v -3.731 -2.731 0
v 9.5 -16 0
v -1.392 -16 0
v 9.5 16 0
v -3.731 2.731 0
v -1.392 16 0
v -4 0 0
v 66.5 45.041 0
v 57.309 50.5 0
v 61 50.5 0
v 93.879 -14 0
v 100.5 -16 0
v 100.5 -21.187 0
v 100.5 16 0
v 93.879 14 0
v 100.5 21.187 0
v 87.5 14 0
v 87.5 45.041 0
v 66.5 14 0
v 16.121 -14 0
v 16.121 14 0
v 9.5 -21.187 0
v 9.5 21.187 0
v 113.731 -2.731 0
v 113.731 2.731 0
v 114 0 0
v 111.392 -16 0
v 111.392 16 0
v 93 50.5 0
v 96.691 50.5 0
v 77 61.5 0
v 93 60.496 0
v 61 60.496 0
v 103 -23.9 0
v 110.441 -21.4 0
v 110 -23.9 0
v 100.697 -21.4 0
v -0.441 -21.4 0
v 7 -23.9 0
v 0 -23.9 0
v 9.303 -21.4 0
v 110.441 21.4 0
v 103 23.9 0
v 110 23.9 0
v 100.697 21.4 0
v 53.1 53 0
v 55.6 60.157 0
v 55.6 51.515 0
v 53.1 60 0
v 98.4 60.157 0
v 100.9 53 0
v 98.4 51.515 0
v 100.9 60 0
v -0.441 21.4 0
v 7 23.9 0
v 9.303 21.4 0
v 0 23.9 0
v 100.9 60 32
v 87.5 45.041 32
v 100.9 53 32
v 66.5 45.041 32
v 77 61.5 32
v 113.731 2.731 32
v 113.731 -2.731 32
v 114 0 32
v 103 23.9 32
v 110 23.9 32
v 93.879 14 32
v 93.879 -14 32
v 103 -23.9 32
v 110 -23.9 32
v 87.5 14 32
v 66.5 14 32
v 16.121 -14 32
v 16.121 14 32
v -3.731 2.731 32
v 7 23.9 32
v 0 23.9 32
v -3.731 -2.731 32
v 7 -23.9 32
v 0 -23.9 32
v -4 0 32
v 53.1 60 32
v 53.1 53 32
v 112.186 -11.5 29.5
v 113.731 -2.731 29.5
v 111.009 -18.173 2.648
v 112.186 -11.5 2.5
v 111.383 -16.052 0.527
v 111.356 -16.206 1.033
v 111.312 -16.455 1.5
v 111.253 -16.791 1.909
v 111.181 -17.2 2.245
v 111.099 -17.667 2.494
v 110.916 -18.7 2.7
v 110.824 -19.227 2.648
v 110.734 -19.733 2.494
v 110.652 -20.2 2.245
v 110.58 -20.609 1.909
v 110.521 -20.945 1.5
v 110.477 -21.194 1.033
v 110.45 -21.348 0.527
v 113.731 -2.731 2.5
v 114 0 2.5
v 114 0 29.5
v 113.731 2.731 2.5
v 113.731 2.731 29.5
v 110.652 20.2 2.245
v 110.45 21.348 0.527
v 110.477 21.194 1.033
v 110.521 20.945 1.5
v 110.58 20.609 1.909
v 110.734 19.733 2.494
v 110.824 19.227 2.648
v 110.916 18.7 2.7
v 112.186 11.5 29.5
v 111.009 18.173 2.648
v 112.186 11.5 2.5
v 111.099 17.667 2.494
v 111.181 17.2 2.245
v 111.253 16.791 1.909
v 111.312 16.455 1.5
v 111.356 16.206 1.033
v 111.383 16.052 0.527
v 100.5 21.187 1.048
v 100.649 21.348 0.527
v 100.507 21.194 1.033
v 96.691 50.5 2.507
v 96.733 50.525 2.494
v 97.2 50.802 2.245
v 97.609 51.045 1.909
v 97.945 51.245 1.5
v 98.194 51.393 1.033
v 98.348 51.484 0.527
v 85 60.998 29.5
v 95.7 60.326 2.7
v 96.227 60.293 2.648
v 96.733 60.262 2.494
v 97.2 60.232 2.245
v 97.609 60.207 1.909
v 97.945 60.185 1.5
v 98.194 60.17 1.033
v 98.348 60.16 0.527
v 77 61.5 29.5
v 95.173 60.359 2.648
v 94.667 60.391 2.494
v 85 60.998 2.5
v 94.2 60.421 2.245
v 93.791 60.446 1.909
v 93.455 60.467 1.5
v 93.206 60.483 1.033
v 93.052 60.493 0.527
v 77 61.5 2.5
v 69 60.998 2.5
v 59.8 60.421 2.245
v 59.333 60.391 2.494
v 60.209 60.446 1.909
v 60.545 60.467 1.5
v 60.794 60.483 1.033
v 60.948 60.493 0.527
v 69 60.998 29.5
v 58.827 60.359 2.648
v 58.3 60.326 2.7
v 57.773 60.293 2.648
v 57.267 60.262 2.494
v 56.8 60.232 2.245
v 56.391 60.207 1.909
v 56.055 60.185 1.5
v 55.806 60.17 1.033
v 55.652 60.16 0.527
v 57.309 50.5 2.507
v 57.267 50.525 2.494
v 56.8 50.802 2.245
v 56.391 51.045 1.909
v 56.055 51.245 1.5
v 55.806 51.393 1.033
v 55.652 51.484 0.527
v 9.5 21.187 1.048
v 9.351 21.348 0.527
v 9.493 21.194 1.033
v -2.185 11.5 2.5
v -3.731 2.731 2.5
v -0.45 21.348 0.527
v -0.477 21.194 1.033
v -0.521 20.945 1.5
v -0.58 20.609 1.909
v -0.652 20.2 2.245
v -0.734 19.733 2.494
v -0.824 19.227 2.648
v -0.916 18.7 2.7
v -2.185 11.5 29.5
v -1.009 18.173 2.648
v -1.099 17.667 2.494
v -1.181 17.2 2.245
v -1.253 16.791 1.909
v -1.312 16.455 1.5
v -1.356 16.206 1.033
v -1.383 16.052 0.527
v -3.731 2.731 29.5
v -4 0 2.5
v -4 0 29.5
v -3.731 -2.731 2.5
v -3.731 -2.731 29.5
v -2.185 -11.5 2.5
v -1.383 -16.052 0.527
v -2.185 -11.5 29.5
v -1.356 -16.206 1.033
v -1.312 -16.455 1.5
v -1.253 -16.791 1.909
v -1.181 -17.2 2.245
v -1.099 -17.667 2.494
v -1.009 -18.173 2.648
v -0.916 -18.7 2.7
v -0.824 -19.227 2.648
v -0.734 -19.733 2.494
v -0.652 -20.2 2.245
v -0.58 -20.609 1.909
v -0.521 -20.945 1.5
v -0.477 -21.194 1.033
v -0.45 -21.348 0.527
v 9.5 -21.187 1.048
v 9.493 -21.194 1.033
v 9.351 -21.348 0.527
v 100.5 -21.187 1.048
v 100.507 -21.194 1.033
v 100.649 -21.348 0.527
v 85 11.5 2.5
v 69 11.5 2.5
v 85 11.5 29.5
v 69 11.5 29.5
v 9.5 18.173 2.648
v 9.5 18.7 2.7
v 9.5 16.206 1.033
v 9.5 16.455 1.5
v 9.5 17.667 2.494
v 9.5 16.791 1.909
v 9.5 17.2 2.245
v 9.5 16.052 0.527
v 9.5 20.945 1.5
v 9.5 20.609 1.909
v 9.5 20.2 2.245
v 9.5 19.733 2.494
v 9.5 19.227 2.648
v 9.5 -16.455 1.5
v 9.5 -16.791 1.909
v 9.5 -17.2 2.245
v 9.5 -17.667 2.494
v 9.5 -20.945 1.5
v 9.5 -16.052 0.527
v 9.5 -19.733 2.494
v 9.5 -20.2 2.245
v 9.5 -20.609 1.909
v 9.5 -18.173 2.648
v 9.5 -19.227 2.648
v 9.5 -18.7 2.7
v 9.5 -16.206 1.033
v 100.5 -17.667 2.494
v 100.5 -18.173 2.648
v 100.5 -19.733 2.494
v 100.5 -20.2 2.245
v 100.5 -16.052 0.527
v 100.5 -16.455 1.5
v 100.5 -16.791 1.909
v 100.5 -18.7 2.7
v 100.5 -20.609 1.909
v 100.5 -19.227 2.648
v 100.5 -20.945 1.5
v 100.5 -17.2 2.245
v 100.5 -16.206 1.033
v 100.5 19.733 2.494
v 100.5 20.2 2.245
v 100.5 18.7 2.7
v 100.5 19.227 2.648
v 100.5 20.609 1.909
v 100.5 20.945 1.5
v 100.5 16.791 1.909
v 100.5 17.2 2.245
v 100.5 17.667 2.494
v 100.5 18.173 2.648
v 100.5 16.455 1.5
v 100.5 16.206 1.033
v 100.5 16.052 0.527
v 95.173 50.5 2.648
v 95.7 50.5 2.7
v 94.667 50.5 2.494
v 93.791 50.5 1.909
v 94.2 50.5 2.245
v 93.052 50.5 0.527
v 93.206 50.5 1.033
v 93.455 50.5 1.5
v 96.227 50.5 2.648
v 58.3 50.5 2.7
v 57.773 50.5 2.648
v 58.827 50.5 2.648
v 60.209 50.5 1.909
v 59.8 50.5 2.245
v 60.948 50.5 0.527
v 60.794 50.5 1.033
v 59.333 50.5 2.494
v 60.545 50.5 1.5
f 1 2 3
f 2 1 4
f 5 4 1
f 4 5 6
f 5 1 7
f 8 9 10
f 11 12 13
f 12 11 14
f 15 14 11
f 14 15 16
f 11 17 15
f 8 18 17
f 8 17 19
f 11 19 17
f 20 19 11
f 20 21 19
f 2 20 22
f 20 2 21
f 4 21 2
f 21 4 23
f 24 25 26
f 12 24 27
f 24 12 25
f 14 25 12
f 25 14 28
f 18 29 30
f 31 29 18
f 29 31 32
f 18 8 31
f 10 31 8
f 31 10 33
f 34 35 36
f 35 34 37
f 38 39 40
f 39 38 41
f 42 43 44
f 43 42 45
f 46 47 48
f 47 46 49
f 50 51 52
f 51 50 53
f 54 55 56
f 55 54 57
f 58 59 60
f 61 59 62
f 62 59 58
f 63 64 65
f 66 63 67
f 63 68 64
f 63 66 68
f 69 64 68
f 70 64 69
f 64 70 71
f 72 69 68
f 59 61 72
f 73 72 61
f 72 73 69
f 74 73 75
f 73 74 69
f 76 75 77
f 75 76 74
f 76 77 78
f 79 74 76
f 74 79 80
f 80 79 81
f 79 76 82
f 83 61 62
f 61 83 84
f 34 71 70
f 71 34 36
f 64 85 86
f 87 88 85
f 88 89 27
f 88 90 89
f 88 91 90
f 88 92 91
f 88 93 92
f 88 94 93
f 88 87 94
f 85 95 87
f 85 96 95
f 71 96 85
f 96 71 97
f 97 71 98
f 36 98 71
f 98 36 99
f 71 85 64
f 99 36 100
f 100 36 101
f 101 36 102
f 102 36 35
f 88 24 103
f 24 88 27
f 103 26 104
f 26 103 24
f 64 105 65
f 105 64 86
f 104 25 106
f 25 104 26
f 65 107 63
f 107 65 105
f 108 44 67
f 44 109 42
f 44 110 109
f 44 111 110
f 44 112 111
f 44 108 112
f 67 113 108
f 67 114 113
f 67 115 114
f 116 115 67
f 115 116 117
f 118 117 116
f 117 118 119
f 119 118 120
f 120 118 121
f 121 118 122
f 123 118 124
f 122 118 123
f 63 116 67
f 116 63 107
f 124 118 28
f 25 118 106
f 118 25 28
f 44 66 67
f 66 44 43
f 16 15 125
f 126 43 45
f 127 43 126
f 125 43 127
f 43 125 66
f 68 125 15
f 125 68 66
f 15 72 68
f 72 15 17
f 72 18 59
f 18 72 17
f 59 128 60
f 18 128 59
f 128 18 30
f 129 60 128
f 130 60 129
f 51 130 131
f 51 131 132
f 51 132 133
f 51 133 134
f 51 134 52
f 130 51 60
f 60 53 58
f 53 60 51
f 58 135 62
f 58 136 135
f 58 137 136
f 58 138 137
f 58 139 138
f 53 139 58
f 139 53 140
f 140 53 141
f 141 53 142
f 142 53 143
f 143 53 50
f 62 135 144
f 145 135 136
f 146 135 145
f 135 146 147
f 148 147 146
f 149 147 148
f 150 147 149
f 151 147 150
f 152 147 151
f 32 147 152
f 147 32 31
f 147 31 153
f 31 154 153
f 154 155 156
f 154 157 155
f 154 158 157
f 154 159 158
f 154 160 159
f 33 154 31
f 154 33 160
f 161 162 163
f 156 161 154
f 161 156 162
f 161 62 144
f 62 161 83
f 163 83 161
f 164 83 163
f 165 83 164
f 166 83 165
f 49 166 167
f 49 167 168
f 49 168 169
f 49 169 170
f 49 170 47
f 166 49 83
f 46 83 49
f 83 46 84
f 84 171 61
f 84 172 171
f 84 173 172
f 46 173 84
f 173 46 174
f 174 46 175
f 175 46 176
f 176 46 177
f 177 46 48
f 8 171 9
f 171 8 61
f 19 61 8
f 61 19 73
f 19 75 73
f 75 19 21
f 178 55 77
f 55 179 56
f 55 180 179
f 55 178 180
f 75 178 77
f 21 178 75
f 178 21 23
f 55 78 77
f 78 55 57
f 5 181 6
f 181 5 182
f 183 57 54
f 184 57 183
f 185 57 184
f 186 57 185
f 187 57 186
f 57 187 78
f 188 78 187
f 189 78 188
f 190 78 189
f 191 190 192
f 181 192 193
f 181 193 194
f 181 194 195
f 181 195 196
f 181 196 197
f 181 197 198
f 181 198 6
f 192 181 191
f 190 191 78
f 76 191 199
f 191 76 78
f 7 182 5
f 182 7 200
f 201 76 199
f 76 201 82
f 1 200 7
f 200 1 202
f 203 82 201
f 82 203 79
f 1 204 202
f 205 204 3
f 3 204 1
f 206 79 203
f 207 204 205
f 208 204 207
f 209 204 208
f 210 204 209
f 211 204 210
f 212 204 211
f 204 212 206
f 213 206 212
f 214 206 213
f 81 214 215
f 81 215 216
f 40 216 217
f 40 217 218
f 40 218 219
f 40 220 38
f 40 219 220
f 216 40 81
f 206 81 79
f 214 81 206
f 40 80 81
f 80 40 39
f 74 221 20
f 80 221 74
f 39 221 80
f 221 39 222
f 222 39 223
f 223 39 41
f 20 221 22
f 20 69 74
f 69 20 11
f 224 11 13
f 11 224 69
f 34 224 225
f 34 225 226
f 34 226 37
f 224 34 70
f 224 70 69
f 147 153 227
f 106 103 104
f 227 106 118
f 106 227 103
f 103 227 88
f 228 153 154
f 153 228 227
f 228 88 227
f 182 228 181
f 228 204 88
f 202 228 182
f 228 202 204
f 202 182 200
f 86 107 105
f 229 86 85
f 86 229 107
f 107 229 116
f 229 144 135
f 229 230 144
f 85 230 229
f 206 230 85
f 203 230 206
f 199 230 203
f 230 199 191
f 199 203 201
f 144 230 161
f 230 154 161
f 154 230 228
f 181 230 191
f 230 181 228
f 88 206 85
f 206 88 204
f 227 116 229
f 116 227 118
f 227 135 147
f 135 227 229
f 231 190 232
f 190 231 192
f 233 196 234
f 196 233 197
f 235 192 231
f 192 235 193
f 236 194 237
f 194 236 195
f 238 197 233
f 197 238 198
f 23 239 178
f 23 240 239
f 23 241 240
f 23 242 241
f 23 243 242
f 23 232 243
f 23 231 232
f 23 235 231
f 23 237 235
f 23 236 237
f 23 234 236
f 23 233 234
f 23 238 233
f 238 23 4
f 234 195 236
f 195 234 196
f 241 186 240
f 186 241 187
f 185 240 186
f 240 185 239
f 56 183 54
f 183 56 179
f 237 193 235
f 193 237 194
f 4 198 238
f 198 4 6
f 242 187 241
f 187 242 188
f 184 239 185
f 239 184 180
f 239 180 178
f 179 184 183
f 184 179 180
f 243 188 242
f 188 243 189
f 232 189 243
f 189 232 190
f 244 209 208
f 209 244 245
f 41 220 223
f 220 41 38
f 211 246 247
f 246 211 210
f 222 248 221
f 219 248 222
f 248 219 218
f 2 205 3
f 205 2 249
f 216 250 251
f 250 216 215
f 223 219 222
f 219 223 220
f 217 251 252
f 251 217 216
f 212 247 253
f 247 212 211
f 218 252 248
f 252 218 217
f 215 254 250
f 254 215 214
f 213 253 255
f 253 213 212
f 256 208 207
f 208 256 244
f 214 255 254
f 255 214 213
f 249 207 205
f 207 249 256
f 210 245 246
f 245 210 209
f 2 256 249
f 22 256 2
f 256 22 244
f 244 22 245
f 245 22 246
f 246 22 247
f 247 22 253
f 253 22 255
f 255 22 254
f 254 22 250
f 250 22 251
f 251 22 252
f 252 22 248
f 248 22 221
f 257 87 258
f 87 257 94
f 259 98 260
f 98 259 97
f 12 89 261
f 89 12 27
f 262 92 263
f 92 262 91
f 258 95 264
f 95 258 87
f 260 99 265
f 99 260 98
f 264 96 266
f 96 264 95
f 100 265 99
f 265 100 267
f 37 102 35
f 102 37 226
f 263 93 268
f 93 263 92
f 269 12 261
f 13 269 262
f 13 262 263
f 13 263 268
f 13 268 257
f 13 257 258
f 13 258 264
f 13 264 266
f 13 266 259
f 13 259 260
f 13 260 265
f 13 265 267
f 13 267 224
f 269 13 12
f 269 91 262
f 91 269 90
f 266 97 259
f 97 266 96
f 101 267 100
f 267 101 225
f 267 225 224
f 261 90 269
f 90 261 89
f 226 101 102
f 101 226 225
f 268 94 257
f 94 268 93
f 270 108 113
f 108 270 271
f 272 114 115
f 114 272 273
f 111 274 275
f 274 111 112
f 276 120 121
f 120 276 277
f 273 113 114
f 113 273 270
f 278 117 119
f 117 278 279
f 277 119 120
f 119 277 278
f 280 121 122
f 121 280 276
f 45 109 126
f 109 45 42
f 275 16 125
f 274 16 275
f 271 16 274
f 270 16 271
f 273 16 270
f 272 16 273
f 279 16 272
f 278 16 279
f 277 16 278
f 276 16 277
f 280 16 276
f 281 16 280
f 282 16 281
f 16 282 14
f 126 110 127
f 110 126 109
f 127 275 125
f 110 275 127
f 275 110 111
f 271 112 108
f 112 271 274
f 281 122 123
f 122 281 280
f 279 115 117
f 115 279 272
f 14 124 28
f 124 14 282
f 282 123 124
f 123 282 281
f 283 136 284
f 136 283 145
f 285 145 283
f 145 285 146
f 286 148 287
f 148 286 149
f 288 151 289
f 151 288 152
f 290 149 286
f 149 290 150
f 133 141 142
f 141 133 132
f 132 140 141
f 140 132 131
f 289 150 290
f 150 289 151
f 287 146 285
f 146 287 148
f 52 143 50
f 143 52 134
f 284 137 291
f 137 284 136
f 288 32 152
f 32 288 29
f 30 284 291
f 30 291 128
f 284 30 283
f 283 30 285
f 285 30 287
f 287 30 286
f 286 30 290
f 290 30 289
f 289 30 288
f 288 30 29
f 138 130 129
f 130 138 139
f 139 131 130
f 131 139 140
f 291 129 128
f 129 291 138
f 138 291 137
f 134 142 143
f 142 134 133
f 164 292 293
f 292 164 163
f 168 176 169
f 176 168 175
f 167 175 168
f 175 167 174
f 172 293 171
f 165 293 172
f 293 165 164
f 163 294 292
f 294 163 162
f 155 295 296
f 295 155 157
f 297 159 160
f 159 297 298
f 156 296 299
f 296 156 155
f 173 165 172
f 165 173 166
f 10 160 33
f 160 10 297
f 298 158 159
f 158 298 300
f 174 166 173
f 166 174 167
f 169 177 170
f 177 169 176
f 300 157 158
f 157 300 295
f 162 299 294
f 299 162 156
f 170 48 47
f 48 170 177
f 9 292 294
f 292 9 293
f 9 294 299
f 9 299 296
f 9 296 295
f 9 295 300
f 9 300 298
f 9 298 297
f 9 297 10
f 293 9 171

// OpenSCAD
$fn = 32;

// ----------------------------------------------------------------------
// Air duct: 28 mm duct, 2.5 mm wall, 32 mm across
// ----------------------------------------------------------------------

// --- parameters (mm) ---
duct_r = 14;              // duct core radius
duct_d = 28;              // duct core diameter
wall = 2.5;               // duct wall thickness
height = 32;              // duct width (extrusion height)
port_r = 23.9;            // port flange half width
port_d = 47.8;            // port flange width
port_t = 7;               // port flange thickness
bolt_d = 5.4;             // port bolt holes
bolt_offset = 18.7;       // bolt hole offset from the port axis
branch_r = 10.5;          // branch core radius
branch_d = 21;            // branch core diameter
branch_len = 60;          // branch length from the run axis

difference() {
  /* outer hull chain: tube with a flat flange plate at every port */
  linear_extrude(height = 32) {
    hull() {
      polygon([[0, -23.9], [0, 23.9], [7, 23.9], [7, -23.9]]);
      translate([10, 0]) circle(r = 14);
    }
    hull() {
      translate([10, 0]) circle(r = 14);
      translate([33, 0]) circle(r = 14);
    }
    hull() {
      translate([33, 0]) circle(r = 14);
      translate([77, 0]) circle(r = 14);
    }
    hull() {
      translate([77, 0]) circle(r = 14);
      translate([100, 0]) circle(r = 14);
    }
    hull() {
      translate([100, 0]) circle(r = 14);
      polygon([[110, 23.9], [110, -23.9], [103, -23.9], [103, 23.9]]);
    }
    hull() {
      translate([77, 0]) circle(r = 10.5);
      translate([77, 33]) circle(r = 10.5);
    }
    hull() {
      translate([77, 33]) circle(r = 10.5);
      translate([77, 51]) circle(r = 10.5);
    }
    hull() {
      translate([77, 51]) circle(r = 10.5);
      polygon([[53.1, 60], [100.9, 60], [100.9, 53], [53.1, 53]]);
    }
  }
  /* air passage: the same chain inset by the wall, 5 mm proud of the ports */
  translate([0, 0, 2.5]) linear_extrude(height = 27) {
    hull() {
      translate([-5, 0]) circle(r = 11.5);
      translate([33, 0]) circle(r = 11.5);
    }
    hull() {
      translate([33, 0]) circle(r = 11.5);
      translate([77, 0]) circle(r = 11.5);
    }
    hull() {
      translate([77, 0]) circle(r = 11.5);
      translate([115, 0]) circle(r = 11.5);
    }
    hull() {
      translate([77, 0]) circle(r = 8);
      translate([77, 33]) circle(r = 8);
    }
    hull() {
      translate([77, 33]) circle(r = 8);
      translate([77, 65]) circle(r = 8);
    }
  }
  translate([0, 0]) rotate([0, 0, -90]) translate([-18.7, -2.5]) rotate([-90, 0, 0]) cylinder(h = 12, d = 5.4);
  translate([0, 0]) rotate([0, 0, -90]) translate([18.7, -2.5]) rotate([-90, 0, 0]) cylinder(h = 12, d = 5.4);
  translate([110, 0]) rotate([0, 0, 90]) translate([-18.7, -2.5]) rotate([-90, 0, 0]) cylinder(h = 12, d = 5.4);
  translate([110, 0]) rotate([0, 0, 90]) translate([18.7, -2.5]) rotate([-90, 0, 0]) cylinder(h = 12, d = 5.4);
  translate([77, 60]) rotate([0, 0, 180]) translate([-18.7, -2.5]) rotate([-90, 0, 0]) cylinder(h = 12, d = 5.4);
  translate([77, 60]) rotate([0, 0, 180]) translate([18.7, -2.5]) rotate([-90, 0, 0]) cylinder(h = 12, d = 5.4);
}
